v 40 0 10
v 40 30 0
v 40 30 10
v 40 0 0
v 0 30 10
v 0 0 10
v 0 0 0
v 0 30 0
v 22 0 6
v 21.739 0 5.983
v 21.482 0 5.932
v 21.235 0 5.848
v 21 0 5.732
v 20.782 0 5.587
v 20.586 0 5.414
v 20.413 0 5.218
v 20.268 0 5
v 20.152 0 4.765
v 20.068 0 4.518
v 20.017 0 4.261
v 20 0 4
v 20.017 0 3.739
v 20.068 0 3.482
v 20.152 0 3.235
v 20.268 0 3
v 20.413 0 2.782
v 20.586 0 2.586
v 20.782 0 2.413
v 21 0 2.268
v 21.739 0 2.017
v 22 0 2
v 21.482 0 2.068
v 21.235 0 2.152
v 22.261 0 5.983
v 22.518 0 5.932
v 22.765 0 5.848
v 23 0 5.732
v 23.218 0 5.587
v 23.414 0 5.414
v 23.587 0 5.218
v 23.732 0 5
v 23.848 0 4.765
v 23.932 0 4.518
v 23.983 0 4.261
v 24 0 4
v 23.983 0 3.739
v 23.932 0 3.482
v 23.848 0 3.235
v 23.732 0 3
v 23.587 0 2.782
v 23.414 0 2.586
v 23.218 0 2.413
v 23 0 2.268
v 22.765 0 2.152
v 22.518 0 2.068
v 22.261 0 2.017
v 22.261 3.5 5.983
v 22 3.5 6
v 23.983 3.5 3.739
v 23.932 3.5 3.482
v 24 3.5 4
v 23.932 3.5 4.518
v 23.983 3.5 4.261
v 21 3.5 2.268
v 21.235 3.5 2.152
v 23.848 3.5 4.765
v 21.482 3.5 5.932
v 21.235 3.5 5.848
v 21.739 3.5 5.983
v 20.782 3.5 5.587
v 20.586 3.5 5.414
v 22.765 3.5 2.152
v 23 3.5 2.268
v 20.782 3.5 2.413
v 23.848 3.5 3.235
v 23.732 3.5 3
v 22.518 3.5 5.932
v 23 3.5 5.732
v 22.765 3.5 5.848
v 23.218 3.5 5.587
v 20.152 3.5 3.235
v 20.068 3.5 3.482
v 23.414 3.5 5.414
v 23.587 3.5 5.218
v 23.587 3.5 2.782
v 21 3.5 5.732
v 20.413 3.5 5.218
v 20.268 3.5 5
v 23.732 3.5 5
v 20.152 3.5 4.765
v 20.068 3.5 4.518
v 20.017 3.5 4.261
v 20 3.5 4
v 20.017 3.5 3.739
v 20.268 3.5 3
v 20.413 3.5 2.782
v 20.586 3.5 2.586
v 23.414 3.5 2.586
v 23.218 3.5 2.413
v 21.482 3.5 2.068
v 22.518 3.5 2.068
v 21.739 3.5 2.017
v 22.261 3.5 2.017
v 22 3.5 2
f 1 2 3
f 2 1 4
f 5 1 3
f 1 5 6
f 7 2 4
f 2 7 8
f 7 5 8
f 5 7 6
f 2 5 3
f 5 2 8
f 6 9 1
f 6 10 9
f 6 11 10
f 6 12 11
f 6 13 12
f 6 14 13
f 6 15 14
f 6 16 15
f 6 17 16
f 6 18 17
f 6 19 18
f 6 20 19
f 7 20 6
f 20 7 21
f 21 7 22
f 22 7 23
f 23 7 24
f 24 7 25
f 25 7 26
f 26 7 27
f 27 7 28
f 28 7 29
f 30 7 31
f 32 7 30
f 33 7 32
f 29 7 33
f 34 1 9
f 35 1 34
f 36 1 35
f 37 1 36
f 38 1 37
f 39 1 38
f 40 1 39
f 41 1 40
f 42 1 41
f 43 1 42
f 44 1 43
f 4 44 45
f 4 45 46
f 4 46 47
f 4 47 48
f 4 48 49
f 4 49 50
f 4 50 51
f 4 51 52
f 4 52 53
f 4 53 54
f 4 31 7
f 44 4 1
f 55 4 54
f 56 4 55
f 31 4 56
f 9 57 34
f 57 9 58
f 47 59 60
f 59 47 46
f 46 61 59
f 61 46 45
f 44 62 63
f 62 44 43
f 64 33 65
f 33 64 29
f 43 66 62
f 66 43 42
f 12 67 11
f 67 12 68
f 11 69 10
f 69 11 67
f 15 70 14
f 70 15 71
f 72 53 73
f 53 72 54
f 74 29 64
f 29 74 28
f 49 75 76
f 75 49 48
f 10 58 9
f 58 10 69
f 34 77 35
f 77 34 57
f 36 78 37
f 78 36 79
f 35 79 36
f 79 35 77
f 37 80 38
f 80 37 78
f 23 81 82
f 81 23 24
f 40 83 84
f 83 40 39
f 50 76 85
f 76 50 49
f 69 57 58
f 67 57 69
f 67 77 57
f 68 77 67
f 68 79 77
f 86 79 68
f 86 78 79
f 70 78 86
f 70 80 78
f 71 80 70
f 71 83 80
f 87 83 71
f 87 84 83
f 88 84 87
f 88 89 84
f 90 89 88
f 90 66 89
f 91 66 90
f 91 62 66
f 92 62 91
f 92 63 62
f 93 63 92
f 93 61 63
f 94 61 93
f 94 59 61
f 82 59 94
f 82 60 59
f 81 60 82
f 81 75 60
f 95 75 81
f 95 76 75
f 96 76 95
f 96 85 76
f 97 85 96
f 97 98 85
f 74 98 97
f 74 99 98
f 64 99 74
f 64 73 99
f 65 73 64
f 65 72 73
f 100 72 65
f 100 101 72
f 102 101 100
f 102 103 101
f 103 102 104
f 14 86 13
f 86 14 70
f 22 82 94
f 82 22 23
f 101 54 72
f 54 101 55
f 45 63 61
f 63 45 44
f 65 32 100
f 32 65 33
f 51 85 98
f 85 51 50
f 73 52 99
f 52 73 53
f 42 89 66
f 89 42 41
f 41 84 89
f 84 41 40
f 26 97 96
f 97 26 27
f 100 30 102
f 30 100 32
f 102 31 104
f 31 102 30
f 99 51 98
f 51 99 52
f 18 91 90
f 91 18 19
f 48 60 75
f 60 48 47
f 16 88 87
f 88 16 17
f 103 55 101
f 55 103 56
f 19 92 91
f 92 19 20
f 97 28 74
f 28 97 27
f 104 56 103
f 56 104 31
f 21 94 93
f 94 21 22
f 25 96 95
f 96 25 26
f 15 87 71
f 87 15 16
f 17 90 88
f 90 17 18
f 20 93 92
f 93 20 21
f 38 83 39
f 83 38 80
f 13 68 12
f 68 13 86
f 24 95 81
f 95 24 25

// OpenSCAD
// units=mm — generated by scad_emitter.py
// part=unnamed
$fn = 48;

difference() { cube([40, 30, 10]); translate([22, -0.5, 4]) rotate([-90, 0, 0]) cylinder(h=4, r=2, $fn=$fn); }
